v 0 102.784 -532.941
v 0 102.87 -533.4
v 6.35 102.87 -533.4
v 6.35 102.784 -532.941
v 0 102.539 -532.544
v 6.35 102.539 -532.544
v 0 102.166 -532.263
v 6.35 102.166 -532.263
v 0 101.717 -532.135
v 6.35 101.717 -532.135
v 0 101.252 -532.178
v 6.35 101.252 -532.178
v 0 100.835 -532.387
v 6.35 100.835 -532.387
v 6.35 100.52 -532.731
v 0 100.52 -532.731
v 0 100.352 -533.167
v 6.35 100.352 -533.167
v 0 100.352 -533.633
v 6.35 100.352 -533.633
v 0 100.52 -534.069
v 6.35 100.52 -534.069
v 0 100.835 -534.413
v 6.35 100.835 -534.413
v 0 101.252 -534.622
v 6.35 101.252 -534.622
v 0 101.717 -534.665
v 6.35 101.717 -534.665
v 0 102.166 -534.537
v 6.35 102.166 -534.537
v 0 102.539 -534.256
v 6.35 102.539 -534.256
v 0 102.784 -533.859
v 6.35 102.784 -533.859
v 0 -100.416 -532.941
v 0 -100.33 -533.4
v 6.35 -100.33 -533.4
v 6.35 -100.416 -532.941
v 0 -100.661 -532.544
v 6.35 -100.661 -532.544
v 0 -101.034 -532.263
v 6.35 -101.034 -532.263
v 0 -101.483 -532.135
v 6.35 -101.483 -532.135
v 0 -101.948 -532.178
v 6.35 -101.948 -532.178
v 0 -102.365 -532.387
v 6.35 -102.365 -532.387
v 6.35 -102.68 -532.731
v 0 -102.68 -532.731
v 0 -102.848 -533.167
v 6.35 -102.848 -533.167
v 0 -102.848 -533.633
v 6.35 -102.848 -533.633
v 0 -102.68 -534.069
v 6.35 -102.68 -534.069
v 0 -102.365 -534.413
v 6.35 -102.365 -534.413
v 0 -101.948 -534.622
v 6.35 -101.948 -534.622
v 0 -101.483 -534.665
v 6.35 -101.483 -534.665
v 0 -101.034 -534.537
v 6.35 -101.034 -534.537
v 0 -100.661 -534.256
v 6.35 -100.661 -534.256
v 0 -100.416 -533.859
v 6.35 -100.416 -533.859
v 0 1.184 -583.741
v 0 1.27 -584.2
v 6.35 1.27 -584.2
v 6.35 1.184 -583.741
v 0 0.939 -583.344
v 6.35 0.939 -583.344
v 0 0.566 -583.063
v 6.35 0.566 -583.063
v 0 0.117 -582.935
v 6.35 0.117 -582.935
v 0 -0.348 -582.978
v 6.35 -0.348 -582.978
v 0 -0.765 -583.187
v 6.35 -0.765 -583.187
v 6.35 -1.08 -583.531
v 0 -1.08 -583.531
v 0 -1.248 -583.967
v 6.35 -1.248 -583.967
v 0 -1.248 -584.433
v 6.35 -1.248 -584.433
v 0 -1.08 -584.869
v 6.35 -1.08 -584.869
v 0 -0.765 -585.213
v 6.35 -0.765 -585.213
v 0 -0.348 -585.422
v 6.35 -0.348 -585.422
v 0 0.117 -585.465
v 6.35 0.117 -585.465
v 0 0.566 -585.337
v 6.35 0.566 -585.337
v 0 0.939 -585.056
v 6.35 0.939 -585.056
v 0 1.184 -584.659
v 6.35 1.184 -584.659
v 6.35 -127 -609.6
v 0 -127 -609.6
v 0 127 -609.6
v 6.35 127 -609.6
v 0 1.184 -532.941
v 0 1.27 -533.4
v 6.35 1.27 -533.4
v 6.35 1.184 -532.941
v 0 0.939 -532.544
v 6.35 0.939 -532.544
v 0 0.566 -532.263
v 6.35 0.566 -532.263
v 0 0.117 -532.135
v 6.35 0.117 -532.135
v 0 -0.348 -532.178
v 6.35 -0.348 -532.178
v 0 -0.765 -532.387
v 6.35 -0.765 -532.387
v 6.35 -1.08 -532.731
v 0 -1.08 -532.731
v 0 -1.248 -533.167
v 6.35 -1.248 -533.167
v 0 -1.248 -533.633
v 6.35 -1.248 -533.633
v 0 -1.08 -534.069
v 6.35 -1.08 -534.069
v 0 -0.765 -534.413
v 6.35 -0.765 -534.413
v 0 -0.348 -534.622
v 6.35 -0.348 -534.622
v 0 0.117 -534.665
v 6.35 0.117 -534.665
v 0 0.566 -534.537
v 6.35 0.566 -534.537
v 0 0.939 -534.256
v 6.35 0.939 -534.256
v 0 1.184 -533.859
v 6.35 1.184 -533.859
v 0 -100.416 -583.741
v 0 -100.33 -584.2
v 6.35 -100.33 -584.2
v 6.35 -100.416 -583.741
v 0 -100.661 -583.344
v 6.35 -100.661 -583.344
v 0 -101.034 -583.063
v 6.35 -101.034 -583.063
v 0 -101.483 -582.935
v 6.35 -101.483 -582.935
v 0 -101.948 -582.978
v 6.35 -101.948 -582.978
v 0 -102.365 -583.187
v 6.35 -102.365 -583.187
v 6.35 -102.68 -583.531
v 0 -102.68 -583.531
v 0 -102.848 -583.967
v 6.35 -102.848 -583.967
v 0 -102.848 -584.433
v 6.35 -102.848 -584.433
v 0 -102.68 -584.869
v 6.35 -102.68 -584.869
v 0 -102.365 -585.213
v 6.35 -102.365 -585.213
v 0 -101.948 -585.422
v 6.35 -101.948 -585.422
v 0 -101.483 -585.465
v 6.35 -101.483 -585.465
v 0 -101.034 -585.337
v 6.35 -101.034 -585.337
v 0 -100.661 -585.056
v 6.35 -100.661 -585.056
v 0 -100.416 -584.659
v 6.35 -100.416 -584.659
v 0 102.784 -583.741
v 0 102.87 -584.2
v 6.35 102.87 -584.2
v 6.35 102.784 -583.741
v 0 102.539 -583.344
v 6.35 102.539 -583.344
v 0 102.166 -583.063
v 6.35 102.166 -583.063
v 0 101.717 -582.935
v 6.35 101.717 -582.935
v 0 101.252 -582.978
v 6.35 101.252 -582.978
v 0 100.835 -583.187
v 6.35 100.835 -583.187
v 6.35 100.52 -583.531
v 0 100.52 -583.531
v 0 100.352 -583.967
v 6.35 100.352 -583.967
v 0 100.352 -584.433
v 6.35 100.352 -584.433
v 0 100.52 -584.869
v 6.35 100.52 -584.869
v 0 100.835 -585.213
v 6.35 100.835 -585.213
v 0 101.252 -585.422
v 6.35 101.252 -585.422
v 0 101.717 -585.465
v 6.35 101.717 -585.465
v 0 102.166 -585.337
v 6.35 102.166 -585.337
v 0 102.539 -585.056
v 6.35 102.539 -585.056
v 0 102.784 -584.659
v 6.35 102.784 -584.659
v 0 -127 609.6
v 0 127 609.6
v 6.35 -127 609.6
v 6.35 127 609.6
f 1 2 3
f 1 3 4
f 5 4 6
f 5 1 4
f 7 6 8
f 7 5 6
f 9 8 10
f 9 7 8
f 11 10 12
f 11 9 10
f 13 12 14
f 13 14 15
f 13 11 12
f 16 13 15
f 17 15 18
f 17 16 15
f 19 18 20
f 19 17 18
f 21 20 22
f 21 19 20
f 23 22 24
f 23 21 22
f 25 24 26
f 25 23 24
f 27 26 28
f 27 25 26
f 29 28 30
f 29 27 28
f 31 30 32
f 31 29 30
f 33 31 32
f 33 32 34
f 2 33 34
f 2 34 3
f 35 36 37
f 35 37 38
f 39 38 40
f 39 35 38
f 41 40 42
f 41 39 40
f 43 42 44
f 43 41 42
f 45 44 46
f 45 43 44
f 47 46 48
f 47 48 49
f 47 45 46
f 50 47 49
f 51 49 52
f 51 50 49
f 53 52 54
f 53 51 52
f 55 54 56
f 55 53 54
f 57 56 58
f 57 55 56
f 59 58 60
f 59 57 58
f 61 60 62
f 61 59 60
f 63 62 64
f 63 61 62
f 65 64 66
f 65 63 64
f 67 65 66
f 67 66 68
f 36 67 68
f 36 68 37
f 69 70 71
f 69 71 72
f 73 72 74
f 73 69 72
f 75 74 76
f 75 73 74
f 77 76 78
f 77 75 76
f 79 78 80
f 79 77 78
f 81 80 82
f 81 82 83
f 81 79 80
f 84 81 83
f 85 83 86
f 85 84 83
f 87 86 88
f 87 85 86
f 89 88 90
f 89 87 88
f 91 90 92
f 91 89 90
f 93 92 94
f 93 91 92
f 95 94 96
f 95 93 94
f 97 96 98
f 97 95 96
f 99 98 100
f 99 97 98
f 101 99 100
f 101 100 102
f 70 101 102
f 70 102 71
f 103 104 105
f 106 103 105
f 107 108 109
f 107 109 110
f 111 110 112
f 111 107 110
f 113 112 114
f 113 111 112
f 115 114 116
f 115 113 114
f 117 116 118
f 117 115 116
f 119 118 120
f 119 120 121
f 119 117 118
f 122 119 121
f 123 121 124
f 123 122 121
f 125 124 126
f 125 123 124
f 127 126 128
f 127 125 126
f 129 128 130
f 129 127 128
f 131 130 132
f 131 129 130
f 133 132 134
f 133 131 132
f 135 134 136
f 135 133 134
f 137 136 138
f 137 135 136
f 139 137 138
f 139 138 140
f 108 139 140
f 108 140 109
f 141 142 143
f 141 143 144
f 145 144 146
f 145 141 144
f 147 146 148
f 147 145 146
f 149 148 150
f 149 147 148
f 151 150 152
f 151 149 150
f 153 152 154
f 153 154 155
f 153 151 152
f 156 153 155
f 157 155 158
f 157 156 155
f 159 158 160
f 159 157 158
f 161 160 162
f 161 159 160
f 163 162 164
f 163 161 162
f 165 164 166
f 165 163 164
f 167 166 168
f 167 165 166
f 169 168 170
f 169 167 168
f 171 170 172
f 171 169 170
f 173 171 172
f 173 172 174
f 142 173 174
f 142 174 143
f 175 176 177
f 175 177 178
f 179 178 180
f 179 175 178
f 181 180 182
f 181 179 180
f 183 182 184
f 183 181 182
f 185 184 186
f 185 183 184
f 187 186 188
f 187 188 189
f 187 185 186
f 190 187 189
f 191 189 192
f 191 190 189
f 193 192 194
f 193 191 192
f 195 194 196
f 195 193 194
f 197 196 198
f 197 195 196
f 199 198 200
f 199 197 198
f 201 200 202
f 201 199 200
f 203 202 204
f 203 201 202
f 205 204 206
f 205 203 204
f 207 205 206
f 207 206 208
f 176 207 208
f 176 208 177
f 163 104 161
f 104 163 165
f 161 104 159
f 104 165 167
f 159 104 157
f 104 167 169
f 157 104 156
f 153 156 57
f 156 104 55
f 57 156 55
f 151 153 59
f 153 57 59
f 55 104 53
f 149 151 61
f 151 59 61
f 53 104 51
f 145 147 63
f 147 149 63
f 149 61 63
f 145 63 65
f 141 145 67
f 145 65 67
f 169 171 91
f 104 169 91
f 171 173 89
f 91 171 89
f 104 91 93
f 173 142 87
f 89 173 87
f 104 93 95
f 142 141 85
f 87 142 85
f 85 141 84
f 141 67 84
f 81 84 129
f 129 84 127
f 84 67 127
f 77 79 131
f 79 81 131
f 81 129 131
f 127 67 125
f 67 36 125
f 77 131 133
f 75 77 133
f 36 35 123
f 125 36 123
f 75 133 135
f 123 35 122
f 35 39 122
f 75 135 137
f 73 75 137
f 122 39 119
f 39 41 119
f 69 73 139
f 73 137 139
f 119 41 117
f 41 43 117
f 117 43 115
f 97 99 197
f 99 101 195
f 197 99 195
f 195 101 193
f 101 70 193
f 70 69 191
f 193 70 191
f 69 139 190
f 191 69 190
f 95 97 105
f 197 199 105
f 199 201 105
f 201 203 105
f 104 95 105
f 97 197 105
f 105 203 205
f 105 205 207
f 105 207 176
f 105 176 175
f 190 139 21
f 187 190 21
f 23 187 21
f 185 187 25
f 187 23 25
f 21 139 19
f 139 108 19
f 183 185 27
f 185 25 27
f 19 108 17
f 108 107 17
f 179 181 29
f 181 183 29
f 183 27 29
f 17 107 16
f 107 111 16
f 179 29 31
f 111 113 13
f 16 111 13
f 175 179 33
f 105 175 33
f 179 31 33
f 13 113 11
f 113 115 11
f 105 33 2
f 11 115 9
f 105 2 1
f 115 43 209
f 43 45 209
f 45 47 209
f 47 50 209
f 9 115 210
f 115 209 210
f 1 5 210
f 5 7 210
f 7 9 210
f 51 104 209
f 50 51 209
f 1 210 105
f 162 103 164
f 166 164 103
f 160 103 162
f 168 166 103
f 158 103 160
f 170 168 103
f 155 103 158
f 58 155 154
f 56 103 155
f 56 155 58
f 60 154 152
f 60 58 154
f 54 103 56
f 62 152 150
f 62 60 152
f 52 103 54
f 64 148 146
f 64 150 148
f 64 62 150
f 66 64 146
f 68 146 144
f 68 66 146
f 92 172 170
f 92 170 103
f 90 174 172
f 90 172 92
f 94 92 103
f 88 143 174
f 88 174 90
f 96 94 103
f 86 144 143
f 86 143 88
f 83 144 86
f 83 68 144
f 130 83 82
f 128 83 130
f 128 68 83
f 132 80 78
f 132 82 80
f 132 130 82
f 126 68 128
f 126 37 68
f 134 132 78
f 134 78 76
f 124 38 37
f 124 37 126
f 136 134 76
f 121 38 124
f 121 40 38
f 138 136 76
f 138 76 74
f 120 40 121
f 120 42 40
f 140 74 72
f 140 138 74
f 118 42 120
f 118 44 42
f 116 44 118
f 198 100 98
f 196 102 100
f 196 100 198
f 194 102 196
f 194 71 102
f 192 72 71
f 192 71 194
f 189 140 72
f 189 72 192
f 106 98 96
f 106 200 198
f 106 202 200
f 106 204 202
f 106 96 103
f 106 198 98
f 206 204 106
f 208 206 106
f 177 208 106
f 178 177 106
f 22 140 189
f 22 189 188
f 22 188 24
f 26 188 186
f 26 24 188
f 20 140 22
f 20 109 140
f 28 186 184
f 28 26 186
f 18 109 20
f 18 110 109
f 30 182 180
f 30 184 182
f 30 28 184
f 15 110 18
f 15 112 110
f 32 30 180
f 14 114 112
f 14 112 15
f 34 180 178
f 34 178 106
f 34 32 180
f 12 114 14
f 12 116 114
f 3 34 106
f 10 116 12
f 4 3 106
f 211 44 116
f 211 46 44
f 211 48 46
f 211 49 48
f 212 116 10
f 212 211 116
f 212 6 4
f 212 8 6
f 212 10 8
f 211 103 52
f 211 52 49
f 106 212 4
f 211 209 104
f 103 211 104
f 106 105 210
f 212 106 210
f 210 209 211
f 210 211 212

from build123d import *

# Parameters (mm, degrees)
F0_W     = 254
F0_H     = 1117.6
F0_H_2   = 101.6
F0_R     = 1.27
F1_DEPTH = 6.35


with BuildPart() as f1:
    # F0 (on Right) → F1 (new body)
    with BuildSketch(Plane.YZ):
        with Locations((0, 50.8)):
            Rectangle(F0_W, F0_H)
        with Locations((0, -558.8)):
            Rectangle(F0_W, F0_H_2)
        with Locations((-101.6, -584.2)):
            Circle(F0_R, mode=Mode.SUBTRACT)
        with Locations((-101.6, -533.4)):
            Circle(F0_R, mode=Mode.SUBTRACT)
        with Locations((0, -584.2)):
            Circle(F0_R, mode=Mode.SUBTRACT)
        with Locations((0, -533.4)):
            Circle(F0_R, mode=Mode.SUBTRACT)
        with Locations((101.6, -584.2)):
            Circle(F0_R, mode=Mode.SUBTRACT)
        with Locations((101.6, -533.4)):
            Circle(F0_R, mode=Mode.SUBTRACT)
    extrude(amount=F1_DEPTH)


solid = f1.part
